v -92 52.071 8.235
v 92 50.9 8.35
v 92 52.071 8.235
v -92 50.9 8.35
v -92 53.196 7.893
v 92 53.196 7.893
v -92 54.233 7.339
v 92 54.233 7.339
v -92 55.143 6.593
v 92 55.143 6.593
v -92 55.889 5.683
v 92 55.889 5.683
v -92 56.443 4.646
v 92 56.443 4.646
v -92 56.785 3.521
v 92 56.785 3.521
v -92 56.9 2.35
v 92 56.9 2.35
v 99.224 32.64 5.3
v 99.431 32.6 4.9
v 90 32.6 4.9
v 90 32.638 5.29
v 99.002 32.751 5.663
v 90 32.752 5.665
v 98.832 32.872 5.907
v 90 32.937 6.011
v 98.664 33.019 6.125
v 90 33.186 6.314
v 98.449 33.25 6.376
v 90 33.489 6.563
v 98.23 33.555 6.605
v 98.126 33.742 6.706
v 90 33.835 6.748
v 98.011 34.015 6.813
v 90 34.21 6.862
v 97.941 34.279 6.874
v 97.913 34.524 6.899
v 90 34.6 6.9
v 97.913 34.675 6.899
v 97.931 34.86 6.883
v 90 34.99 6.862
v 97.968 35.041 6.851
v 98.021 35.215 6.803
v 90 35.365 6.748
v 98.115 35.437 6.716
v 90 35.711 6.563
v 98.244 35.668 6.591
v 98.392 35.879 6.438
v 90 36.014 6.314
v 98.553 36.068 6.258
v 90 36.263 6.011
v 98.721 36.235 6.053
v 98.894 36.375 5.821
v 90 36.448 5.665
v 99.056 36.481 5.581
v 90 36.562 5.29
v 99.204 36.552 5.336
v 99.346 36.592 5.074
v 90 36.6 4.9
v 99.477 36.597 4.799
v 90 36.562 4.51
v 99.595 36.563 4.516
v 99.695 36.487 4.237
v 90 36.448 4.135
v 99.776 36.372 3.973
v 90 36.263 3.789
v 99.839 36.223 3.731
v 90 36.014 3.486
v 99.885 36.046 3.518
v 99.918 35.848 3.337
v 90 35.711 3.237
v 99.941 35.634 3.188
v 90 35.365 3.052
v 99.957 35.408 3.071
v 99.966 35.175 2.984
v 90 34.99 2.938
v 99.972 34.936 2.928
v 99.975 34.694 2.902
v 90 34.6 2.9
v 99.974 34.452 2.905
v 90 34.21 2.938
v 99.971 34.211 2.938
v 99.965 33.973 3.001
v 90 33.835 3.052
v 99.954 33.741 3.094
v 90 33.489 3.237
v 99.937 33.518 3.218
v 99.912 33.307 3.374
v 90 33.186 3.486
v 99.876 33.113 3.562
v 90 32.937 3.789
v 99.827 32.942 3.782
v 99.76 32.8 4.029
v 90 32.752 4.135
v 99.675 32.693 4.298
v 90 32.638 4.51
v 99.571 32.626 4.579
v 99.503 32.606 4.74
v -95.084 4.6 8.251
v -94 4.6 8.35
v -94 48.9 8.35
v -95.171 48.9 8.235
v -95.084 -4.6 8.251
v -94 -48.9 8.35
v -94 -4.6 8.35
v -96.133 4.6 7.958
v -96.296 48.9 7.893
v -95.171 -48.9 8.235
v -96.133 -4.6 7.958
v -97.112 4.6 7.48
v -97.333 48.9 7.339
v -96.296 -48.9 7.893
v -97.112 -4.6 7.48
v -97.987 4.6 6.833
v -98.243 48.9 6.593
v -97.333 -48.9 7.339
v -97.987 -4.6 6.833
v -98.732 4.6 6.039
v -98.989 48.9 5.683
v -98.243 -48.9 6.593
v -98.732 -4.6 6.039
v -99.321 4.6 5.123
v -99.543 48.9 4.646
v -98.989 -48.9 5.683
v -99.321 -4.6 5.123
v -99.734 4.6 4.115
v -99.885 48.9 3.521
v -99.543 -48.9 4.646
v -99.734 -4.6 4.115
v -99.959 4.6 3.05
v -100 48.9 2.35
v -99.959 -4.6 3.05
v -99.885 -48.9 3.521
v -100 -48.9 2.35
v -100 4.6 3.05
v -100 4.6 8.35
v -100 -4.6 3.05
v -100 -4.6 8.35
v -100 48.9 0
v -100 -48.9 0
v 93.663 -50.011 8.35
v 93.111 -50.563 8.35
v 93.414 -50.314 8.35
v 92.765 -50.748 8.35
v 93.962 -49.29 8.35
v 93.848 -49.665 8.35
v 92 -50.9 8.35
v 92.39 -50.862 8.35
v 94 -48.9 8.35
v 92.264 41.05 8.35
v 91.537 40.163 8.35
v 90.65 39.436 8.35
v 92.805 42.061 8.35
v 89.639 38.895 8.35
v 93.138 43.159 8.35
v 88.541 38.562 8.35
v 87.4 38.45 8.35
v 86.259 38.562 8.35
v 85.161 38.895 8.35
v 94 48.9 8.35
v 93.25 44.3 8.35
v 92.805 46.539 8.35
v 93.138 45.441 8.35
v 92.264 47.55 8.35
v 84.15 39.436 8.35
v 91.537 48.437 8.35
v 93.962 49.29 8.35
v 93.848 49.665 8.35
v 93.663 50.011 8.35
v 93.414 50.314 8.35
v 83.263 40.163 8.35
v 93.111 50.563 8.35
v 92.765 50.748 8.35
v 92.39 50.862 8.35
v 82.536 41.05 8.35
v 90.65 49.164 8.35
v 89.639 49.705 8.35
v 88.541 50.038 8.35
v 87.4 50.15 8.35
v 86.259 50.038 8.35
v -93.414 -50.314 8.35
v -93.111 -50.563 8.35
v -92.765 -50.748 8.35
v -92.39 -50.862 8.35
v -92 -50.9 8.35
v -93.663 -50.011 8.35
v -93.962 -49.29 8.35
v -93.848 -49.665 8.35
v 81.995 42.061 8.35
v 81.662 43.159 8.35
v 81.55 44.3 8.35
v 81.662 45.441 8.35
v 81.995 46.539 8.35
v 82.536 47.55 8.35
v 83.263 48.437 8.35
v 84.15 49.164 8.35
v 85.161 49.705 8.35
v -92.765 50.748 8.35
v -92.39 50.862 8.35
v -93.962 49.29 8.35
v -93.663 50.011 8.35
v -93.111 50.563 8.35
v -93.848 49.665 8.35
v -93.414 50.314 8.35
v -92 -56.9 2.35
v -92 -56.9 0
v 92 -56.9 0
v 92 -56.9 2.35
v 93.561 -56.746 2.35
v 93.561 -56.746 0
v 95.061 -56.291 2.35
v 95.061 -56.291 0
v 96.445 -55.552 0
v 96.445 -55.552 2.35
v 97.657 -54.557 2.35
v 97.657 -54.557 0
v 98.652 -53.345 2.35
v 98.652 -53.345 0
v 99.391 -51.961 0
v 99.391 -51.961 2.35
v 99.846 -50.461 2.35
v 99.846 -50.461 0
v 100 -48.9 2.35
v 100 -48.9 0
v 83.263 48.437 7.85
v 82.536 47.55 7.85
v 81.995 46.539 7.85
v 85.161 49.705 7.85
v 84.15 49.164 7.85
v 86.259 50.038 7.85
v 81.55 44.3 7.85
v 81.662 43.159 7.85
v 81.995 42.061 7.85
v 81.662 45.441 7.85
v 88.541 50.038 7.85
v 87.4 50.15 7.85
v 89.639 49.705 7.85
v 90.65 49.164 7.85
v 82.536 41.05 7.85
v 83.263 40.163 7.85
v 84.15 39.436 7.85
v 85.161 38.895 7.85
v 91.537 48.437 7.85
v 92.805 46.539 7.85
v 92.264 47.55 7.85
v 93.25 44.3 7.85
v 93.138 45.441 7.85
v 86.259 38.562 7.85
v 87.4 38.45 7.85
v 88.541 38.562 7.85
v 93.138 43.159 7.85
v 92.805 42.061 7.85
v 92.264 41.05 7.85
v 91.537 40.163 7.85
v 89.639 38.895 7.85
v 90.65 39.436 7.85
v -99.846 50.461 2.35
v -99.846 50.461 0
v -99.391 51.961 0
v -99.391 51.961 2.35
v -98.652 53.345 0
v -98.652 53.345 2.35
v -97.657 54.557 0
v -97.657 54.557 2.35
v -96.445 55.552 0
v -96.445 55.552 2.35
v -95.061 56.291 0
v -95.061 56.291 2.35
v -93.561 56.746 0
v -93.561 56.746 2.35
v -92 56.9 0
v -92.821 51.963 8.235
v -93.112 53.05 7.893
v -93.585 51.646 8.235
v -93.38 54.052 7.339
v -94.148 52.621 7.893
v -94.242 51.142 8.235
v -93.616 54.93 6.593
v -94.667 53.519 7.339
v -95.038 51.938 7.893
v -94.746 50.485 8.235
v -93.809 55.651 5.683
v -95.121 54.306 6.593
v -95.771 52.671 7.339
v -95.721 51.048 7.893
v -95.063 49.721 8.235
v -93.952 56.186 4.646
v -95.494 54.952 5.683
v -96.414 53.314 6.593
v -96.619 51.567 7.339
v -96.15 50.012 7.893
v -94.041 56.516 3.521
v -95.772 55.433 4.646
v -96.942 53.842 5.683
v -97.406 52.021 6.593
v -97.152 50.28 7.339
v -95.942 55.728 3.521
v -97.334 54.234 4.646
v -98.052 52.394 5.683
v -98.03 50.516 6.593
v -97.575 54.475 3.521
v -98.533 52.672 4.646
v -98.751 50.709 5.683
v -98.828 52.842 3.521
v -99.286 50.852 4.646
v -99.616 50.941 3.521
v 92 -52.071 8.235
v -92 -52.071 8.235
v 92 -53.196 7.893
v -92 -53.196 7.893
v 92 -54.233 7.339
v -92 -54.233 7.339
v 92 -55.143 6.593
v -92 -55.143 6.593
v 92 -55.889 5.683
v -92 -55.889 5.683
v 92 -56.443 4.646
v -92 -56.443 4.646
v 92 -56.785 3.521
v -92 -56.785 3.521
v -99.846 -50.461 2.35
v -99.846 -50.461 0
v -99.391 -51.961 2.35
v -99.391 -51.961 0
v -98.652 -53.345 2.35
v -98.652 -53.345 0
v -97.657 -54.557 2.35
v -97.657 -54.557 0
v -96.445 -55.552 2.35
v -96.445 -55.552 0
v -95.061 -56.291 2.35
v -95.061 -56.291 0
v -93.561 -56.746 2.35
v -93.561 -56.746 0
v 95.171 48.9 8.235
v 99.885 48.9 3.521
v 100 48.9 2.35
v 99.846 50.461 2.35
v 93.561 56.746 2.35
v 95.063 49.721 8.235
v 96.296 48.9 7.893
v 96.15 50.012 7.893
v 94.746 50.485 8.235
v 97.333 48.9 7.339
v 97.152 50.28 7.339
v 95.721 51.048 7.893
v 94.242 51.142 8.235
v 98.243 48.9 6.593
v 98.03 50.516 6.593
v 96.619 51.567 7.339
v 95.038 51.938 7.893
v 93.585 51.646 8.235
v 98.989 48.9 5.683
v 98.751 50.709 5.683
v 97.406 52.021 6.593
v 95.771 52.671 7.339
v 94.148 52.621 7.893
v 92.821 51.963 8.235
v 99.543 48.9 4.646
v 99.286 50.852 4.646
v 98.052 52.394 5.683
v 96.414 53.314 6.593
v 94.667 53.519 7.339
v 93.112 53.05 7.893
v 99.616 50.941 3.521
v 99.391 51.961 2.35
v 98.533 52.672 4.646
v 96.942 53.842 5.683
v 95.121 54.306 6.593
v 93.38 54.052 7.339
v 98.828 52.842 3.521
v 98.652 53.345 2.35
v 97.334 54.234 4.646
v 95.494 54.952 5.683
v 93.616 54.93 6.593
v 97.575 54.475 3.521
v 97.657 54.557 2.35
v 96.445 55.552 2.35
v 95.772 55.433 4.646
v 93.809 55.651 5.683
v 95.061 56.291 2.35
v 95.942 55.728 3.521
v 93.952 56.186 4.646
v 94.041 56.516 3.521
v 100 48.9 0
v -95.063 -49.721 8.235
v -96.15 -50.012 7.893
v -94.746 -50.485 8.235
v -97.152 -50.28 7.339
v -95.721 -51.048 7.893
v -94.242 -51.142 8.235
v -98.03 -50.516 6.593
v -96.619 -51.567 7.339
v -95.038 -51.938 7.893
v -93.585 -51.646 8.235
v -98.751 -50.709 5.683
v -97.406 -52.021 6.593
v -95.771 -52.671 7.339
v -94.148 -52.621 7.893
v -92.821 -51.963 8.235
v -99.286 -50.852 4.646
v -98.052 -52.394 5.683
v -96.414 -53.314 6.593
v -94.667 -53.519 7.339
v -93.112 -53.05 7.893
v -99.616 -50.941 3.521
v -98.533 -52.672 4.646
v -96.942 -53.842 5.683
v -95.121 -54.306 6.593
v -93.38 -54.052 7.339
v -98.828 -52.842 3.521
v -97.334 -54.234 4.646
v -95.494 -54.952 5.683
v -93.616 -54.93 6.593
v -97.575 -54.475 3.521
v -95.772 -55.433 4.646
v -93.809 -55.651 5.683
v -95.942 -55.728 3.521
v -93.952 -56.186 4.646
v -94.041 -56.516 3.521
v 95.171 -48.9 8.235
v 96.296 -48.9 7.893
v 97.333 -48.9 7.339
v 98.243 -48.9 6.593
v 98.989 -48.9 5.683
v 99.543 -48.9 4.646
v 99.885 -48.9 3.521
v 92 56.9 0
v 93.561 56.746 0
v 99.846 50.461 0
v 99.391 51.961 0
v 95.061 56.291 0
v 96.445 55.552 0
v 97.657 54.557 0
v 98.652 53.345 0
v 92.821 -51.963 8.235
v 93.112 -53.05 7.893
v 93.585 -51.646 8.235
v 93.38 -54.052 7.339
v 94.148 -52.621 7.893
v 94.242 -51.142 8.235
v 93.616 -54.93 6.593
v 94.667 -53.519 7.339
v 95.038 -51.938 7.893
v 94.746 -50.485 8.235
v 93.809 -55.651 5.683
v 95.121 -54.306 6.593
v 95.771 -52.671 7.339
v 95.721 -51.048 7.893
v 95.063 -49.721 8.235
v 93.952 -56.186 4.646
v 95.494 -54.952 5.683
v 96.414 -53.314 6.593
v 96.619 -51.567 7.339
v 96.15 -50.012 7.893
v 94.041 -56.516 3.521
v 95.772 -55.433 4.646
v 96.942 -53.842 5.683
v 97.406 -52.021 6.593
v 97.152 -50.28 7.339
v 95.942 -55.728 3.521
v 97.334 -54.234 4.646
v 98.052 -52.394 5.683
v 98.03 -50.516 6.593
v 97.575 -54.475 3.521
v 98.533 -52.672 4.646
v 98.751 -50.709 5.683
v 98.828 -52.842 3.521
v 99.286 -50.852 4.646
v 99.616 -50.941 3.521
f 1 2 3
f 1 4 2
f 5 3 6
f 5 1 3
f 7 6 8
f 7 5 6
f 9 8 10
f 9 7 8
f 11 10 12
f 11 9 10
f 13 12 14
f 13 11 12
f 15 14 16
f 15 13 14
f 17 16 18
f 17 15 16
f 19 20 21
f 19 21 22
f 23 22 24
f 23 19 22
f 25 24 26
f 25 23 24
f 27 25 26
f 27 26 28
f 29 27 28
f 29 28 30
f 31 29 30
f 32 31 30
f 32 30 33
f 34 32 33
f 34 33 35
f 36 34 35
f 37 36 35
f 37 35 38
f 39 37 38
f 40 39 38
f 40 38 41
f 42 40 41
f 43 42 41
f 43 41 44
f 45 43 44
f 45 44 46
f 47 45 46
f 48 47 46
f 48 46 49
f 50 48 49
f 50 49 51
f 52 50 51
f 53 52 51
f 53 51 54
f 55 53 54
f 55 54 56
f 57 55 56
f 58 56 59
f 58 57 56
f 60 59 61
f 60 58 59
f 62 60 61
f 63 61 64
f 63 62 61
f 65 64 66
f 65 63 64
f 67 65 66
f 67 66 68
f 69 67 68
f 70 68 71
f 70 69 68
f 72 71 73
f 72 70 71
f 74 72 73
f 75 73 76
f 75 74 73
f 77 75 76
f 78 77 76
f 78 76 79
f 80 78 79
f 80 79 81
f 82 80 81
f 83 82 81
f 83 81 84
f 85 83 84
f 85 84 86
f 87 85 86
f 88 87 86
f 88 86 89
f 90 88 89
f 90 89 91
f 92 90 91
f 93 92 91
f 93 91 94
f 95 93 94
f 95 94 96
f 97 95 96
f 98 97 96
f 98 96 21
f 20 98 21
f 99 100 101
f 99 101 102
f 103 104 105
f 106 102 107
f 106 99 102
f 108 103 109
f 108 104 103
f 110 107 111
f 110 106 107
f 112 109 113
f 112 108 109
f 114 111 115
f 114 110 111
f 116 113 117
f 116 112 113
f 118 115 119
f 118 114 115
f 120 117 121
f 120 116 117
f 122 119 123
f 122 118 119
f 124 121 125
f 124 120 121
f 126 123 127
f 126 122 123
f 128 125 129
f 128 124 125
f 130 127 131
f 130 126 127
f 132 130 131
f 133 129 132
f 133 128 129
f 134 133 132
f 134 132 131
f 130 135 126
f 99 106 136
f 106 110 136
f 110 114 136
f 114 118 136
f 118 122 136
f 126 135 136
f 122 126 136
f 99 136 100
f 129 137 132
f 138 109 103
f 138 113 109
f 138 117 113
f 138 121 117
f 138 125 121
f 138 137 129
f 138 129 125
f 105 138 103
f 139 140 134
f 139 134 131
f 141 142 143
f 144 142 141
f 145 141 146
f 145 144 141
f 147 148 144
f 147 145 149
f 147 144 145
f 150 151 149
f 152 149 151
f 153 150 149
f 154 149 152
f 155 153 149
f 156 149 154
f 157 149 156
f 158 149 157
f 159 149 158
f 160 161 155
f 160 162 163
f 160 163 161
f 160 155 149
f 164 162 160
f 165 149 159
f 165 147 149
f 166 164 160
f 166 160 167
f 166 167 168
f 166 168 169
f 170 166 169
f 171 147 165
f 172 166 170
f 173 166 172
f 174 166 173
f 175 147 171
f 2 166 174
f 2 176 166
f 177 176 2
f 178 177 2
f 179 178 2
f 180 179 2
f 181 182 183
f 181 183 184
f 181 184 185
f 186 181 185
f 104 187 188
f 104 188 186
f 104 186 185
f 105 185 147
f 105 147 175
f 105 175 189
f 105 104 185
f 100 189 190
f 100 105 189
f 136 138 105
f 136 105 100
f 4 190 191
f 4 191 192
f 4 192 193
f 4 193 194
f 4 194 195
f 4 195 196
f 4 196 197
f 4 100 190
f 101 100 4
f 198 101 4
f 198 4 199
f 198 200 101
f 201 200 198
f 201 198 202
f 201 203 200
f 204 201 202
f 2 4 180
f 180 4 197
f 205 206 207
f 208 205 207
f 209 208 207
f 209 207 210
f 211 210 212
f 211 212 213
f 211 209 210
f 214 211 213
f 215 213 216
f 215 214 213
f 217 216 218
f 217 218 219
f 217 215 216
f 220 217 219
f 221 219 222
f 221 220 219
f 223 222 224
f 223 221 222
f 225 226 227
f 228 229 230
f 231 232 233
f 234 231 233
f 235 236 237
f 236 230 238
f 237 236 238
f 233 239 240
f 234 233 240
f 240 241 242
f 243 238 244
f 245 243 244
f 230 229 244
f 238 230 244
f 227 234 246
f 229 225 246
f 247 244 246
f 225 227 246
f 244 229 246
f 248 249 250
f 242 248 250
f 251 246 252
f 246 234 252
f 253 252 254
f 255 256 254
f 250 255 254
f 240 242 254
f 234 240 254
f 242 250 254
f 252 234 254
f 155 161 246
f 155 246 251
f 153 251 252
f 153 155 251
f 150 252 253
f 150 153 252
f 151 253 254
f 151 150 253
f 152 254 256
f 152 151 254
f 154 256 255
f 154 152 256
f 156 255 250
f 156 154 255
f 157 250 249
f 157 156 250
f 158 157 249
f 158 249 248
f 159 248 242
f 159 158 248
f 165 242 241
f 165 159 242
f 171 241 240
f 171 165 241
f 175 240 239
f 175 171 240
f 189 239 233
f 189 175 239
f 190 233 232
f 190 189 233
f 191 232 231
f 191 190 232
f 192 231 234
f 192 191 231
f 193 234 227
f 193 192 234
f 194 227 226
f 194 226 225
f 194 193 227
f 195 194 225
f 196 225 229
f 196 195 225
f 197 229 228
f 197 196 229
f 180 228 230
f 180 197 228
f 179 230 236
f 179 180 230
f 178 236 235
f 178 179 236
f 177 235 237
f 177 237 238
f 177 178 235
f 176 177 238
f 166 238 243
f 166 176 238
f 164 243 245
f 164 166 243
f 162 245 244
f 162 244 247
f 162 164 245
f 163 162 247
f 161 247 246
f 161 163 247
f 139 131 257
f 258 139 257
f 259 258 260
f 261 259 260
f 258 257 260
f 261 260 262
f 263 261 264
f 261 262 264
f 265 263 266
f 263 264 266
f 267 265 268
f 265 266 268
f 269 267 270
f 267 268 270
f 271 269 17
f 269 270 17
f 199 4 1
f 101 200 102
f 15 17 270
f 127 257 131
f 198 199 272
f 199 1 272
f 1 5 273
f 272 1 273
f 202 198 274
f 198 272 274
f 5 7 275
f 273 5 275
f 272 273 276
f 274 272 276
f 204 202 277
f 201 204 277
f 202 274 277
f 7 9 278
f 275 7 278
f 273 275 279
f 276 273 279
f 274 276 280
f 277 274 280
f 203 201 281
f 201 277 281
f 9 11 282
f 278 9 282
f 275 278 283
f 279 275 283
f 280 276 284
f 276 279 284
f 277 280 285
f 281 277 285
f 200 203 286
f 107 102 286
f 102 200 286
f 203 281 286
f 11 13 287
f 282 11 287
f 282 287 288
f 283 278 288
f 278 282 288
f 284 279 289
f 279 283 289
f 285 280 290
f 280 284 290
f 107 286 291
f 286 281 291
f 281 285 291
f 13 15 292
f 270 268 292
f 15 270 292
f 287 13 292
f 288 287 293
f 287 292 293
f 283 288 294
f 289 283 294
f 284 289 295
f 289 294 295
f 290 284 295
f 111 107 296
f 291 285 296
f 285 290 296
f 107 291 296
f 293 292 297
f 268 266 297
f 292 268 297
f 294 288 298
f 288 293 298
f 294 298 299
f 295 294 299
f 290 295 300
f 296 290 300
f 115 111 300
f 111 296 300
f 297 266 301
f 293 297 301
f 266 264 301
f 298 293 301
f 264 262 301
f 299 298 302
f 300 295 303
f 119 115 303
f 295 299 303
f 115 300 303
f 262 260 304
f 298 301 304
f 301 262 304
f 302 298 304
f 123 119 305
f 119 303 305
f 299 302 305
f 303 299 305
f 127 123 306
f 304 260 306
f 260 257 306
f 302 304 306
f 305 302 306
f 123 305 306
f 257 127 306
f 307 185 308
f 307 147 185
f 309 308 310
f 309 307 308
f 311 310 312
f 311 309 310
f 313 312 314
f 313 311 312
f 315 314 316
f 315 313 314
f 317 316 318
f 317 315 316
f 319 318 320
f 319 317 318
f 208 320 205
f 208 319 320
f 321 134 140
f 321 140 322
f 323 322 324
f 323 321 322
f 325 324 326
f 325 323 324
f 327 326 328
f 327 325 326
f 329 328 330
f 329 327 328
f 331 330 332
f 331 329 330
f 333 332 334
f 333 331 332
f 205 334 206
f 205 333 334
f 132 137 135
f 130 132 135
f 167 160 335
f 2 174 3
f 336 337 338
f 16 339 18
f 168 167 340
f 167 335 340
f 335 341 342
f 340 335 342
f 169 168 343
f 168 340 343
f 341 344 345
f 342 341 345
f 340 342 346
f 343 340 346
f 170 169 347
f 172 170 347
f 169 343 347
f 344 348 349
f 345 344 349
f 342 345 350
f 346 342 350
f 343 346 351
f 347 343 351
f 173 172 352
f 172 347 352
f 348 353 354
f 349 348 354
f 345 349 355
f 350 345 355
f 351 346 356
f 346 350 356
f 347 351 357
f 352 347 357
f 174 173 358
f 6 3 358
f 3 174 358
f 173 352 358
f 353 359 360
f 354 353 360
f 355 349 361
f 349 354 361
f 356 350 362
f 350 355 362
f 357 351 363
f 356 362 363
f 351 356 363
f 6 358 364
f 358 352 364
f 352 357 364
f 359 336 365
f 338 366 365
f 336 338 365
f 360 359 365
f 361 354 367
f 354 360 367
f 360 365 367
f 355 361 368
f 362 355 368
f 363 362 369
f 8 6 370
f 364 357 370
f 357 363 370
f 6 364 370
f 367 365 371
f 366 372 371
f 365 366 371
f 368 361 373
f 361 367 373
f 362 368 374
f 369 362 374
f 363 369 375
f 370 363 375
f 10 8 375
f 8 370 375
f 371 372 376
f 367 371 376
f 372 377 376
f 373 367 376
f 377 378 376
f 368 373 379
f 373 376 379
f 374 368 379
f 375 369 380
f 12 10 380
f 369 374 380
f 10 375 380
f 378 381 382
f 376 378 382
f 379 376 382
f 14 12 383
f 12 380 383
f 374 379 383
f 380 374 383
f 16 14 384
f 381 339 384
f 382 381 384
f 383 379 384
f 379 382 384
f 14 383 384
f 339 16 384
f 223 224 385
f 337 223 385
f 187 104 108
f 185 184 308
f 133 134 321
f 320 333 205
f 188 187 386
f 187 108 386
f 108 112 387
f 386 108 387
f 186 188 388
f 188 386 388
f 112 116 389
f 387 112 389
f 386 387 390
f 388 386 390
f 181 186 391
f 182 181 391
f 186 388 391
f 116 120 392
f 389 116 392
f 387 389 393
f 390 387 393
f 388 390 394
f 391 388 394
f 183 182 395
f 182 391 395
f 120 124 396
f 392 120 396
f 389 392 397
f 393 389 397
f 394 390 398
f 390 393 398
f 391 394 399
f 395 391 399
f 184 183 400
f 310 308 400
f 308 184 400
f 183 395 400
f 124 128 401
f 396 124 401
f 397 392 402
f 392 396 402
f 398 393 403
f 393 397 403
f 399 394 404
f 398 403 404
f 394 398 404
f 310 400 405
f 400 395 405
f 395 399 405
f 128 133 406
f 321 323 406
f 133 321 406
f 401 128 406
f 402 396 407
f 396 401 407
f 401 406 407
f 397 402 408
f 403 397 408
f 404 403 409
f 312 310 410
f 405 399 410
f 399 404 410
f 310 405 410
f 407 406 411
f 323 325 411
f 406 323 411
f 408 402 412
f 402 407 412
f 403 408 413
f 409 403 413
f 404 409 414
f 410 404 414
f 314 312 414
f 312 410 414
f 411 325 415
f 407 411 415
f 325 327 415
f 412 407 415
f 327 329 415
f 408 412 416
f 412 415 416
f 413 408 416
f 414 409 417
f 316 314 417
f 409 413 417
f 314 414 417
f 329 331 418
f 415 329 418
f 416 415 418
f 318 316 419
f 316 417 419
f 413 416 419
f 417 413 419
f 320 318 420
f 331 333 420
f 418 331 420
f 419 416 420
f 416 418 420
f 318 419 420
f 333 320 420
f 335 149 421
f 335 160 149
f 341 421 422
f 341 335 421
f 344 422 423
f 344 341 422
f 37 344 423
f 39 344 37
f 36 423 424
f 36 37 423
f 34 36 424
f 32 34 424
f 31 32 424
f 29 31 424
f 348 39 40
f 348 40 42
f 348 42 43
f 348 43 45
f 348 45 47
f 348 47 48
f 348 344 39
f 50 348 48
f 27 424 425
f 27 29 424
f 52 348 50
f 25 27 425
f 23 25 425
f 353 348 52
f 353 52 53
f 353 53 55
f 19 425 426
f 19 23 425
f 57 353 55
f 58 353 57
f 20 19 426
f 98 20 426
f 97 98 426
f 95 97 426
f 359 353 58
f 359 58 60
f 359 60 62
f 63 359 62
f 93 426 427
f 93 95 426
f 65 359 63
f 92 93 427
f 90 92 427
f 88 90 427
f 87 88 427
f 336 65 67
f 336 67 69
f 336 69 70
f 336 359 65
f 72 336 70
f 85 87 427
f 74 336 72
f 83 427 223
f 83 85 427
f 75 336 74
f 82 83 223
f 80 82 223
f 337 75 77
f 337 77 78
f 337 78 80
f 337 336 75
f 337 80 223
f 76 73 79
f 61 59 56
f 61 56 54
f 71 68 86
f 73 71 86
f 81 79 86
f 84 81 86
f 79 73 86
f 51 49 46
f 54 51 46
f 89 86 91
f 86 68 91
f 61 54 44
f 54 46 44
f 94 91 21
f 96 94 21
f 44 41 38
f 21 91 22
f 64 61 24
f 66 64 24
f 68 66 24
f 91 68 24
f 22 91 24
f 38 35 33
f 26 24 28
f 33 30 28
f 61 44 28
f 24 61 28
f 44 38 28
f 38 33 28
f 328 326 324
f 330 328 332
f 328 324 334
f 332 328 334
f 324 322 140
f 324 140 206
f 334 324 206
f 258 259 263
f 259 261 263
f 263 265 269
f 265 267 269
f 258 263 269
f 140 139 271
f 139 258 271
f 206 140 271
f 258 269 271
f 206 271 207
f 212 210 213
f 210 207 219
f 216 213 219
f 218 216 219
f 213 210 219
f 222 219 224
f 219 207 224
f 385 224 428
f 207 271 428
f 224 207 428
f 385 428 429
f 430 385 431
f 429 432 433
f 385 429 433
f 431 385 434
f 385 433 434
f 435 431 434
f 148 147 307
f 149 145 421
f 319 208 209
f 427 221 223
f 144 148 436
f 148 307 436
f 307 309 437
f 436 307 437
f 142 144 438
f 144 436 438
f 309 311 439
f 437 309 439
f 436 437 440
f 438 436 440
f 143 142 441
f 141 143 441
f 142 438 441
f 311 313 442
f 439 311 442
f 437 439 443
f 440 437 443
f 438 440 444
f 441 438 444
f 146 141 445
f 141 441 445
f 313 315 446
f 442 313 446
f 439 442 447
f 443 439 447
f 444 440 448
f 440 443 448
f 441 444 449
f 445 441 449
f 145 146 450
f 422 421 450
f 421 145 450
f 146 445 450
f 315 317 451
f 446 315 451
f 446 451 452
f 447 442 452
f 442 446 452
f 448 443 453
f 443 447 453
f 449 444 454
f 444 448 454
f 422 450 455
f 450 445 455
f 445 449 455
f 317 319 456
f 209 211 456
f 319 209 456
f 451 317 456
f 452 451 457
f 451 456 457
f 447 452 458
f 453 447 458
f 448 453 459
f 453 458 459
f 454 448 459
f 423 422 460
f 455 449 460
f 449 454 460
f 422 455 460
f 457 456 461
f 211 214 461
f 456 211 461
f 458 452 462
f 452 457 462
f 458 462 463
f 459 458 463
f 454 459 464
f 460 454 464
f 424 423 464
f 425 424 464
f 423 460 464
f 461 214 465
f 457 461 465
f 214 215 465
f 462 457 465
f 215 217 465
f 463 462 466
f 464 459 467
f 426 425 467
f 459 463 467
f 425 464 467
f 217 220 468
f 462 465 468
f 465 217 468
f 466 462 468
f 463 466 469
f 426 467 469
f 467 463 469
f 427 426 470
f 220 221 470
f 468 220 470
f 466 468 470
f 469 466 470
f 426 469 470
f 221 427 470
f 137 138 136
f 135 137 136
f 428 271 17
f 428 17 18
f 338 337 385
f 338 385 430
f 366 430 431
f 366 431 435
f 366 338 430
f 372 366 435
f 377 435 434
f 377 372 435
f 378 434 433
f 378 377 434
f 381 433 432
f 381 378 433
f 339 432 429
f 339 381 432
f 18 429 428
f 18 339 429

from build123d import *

# Parameters (mm, degrees)
F0_W      = 200
F0_H      = 113.8
F1_DEPTH  = 8.35
F2_R      = 8
F3_R      = 6
F5_R      = 5.85
F6_DEPTH  = 0.5
F8_R      = 2
F9_DEPTH  = 10
F12_W     = 9.2
F12_H     = 5.3
F13_DEPTH = 25


with BuildPart() as f1:
    # F0 (on Top) → F1 (new body)
    with BuildSketch(Plane.XY):
        Rectangle(F0_W, F0_H)
    extrude(amount=F1_DEPTH)

    # F2
    f2_edges = [f1.edges().sort_by_distance(p)[0] for p in [
        (-100, -56.9, 4.175),
        (100, -56.9, 4.175),
        (-100, 56.9, 4.175),
        (100, 56.9, 4.175),
    ]]
    fillet(f2_edges, radius=F2_R)

    # F3
    f3_edges = [f1.edges().sort_by_distance(p)[0] for p in [
        (100, 0, 8.35),
        (97.656854, -54.556854, 8.35),
        (97.656854, 54.556854, 8.35),
        (0, -56.9, 8.35),
        (0, 56.9, 8.35),
        (-97.656854, -54.556854, 8.35),
        (-97.656854, 54.556854, 8.35),
    ]]
    fillet(f3_edges, radius=F3_R)

    # F5 (on face) → F6 (cut)
    with BuildSketch(Plane(origin=(0, 0, 8.35), x_dir=(1, 0, 0), z_dir=(0, 0, -1))):
        with Locations((87.4, -44.3)):
            Circle(F5_R)
    extrude(amount=F6_DEPTH, mode=Mode.SUBTRACT)

    # F8 (on face) → F9 (cut)
    with BuildSketch(Plane(origin=(100, 0, 0), x_dir=(0, -1, 0), z_dir=(-1, 0, 0))):
        with Locations((-34.6, 4.9)):
            Circle(F8_R)
    extrude(amount=F9_DEPTH, mode=Mode.SUBTRACT)

    # F12 (on face) → F13 (join)
    with BuildSketch(Plane.YZ.offset(-100)):
        with Locations((0, 5.7)):
            Rectangle(F12_W, F12_H)
    extrude(amount=F13_DEPTH)


solid = f1.part
